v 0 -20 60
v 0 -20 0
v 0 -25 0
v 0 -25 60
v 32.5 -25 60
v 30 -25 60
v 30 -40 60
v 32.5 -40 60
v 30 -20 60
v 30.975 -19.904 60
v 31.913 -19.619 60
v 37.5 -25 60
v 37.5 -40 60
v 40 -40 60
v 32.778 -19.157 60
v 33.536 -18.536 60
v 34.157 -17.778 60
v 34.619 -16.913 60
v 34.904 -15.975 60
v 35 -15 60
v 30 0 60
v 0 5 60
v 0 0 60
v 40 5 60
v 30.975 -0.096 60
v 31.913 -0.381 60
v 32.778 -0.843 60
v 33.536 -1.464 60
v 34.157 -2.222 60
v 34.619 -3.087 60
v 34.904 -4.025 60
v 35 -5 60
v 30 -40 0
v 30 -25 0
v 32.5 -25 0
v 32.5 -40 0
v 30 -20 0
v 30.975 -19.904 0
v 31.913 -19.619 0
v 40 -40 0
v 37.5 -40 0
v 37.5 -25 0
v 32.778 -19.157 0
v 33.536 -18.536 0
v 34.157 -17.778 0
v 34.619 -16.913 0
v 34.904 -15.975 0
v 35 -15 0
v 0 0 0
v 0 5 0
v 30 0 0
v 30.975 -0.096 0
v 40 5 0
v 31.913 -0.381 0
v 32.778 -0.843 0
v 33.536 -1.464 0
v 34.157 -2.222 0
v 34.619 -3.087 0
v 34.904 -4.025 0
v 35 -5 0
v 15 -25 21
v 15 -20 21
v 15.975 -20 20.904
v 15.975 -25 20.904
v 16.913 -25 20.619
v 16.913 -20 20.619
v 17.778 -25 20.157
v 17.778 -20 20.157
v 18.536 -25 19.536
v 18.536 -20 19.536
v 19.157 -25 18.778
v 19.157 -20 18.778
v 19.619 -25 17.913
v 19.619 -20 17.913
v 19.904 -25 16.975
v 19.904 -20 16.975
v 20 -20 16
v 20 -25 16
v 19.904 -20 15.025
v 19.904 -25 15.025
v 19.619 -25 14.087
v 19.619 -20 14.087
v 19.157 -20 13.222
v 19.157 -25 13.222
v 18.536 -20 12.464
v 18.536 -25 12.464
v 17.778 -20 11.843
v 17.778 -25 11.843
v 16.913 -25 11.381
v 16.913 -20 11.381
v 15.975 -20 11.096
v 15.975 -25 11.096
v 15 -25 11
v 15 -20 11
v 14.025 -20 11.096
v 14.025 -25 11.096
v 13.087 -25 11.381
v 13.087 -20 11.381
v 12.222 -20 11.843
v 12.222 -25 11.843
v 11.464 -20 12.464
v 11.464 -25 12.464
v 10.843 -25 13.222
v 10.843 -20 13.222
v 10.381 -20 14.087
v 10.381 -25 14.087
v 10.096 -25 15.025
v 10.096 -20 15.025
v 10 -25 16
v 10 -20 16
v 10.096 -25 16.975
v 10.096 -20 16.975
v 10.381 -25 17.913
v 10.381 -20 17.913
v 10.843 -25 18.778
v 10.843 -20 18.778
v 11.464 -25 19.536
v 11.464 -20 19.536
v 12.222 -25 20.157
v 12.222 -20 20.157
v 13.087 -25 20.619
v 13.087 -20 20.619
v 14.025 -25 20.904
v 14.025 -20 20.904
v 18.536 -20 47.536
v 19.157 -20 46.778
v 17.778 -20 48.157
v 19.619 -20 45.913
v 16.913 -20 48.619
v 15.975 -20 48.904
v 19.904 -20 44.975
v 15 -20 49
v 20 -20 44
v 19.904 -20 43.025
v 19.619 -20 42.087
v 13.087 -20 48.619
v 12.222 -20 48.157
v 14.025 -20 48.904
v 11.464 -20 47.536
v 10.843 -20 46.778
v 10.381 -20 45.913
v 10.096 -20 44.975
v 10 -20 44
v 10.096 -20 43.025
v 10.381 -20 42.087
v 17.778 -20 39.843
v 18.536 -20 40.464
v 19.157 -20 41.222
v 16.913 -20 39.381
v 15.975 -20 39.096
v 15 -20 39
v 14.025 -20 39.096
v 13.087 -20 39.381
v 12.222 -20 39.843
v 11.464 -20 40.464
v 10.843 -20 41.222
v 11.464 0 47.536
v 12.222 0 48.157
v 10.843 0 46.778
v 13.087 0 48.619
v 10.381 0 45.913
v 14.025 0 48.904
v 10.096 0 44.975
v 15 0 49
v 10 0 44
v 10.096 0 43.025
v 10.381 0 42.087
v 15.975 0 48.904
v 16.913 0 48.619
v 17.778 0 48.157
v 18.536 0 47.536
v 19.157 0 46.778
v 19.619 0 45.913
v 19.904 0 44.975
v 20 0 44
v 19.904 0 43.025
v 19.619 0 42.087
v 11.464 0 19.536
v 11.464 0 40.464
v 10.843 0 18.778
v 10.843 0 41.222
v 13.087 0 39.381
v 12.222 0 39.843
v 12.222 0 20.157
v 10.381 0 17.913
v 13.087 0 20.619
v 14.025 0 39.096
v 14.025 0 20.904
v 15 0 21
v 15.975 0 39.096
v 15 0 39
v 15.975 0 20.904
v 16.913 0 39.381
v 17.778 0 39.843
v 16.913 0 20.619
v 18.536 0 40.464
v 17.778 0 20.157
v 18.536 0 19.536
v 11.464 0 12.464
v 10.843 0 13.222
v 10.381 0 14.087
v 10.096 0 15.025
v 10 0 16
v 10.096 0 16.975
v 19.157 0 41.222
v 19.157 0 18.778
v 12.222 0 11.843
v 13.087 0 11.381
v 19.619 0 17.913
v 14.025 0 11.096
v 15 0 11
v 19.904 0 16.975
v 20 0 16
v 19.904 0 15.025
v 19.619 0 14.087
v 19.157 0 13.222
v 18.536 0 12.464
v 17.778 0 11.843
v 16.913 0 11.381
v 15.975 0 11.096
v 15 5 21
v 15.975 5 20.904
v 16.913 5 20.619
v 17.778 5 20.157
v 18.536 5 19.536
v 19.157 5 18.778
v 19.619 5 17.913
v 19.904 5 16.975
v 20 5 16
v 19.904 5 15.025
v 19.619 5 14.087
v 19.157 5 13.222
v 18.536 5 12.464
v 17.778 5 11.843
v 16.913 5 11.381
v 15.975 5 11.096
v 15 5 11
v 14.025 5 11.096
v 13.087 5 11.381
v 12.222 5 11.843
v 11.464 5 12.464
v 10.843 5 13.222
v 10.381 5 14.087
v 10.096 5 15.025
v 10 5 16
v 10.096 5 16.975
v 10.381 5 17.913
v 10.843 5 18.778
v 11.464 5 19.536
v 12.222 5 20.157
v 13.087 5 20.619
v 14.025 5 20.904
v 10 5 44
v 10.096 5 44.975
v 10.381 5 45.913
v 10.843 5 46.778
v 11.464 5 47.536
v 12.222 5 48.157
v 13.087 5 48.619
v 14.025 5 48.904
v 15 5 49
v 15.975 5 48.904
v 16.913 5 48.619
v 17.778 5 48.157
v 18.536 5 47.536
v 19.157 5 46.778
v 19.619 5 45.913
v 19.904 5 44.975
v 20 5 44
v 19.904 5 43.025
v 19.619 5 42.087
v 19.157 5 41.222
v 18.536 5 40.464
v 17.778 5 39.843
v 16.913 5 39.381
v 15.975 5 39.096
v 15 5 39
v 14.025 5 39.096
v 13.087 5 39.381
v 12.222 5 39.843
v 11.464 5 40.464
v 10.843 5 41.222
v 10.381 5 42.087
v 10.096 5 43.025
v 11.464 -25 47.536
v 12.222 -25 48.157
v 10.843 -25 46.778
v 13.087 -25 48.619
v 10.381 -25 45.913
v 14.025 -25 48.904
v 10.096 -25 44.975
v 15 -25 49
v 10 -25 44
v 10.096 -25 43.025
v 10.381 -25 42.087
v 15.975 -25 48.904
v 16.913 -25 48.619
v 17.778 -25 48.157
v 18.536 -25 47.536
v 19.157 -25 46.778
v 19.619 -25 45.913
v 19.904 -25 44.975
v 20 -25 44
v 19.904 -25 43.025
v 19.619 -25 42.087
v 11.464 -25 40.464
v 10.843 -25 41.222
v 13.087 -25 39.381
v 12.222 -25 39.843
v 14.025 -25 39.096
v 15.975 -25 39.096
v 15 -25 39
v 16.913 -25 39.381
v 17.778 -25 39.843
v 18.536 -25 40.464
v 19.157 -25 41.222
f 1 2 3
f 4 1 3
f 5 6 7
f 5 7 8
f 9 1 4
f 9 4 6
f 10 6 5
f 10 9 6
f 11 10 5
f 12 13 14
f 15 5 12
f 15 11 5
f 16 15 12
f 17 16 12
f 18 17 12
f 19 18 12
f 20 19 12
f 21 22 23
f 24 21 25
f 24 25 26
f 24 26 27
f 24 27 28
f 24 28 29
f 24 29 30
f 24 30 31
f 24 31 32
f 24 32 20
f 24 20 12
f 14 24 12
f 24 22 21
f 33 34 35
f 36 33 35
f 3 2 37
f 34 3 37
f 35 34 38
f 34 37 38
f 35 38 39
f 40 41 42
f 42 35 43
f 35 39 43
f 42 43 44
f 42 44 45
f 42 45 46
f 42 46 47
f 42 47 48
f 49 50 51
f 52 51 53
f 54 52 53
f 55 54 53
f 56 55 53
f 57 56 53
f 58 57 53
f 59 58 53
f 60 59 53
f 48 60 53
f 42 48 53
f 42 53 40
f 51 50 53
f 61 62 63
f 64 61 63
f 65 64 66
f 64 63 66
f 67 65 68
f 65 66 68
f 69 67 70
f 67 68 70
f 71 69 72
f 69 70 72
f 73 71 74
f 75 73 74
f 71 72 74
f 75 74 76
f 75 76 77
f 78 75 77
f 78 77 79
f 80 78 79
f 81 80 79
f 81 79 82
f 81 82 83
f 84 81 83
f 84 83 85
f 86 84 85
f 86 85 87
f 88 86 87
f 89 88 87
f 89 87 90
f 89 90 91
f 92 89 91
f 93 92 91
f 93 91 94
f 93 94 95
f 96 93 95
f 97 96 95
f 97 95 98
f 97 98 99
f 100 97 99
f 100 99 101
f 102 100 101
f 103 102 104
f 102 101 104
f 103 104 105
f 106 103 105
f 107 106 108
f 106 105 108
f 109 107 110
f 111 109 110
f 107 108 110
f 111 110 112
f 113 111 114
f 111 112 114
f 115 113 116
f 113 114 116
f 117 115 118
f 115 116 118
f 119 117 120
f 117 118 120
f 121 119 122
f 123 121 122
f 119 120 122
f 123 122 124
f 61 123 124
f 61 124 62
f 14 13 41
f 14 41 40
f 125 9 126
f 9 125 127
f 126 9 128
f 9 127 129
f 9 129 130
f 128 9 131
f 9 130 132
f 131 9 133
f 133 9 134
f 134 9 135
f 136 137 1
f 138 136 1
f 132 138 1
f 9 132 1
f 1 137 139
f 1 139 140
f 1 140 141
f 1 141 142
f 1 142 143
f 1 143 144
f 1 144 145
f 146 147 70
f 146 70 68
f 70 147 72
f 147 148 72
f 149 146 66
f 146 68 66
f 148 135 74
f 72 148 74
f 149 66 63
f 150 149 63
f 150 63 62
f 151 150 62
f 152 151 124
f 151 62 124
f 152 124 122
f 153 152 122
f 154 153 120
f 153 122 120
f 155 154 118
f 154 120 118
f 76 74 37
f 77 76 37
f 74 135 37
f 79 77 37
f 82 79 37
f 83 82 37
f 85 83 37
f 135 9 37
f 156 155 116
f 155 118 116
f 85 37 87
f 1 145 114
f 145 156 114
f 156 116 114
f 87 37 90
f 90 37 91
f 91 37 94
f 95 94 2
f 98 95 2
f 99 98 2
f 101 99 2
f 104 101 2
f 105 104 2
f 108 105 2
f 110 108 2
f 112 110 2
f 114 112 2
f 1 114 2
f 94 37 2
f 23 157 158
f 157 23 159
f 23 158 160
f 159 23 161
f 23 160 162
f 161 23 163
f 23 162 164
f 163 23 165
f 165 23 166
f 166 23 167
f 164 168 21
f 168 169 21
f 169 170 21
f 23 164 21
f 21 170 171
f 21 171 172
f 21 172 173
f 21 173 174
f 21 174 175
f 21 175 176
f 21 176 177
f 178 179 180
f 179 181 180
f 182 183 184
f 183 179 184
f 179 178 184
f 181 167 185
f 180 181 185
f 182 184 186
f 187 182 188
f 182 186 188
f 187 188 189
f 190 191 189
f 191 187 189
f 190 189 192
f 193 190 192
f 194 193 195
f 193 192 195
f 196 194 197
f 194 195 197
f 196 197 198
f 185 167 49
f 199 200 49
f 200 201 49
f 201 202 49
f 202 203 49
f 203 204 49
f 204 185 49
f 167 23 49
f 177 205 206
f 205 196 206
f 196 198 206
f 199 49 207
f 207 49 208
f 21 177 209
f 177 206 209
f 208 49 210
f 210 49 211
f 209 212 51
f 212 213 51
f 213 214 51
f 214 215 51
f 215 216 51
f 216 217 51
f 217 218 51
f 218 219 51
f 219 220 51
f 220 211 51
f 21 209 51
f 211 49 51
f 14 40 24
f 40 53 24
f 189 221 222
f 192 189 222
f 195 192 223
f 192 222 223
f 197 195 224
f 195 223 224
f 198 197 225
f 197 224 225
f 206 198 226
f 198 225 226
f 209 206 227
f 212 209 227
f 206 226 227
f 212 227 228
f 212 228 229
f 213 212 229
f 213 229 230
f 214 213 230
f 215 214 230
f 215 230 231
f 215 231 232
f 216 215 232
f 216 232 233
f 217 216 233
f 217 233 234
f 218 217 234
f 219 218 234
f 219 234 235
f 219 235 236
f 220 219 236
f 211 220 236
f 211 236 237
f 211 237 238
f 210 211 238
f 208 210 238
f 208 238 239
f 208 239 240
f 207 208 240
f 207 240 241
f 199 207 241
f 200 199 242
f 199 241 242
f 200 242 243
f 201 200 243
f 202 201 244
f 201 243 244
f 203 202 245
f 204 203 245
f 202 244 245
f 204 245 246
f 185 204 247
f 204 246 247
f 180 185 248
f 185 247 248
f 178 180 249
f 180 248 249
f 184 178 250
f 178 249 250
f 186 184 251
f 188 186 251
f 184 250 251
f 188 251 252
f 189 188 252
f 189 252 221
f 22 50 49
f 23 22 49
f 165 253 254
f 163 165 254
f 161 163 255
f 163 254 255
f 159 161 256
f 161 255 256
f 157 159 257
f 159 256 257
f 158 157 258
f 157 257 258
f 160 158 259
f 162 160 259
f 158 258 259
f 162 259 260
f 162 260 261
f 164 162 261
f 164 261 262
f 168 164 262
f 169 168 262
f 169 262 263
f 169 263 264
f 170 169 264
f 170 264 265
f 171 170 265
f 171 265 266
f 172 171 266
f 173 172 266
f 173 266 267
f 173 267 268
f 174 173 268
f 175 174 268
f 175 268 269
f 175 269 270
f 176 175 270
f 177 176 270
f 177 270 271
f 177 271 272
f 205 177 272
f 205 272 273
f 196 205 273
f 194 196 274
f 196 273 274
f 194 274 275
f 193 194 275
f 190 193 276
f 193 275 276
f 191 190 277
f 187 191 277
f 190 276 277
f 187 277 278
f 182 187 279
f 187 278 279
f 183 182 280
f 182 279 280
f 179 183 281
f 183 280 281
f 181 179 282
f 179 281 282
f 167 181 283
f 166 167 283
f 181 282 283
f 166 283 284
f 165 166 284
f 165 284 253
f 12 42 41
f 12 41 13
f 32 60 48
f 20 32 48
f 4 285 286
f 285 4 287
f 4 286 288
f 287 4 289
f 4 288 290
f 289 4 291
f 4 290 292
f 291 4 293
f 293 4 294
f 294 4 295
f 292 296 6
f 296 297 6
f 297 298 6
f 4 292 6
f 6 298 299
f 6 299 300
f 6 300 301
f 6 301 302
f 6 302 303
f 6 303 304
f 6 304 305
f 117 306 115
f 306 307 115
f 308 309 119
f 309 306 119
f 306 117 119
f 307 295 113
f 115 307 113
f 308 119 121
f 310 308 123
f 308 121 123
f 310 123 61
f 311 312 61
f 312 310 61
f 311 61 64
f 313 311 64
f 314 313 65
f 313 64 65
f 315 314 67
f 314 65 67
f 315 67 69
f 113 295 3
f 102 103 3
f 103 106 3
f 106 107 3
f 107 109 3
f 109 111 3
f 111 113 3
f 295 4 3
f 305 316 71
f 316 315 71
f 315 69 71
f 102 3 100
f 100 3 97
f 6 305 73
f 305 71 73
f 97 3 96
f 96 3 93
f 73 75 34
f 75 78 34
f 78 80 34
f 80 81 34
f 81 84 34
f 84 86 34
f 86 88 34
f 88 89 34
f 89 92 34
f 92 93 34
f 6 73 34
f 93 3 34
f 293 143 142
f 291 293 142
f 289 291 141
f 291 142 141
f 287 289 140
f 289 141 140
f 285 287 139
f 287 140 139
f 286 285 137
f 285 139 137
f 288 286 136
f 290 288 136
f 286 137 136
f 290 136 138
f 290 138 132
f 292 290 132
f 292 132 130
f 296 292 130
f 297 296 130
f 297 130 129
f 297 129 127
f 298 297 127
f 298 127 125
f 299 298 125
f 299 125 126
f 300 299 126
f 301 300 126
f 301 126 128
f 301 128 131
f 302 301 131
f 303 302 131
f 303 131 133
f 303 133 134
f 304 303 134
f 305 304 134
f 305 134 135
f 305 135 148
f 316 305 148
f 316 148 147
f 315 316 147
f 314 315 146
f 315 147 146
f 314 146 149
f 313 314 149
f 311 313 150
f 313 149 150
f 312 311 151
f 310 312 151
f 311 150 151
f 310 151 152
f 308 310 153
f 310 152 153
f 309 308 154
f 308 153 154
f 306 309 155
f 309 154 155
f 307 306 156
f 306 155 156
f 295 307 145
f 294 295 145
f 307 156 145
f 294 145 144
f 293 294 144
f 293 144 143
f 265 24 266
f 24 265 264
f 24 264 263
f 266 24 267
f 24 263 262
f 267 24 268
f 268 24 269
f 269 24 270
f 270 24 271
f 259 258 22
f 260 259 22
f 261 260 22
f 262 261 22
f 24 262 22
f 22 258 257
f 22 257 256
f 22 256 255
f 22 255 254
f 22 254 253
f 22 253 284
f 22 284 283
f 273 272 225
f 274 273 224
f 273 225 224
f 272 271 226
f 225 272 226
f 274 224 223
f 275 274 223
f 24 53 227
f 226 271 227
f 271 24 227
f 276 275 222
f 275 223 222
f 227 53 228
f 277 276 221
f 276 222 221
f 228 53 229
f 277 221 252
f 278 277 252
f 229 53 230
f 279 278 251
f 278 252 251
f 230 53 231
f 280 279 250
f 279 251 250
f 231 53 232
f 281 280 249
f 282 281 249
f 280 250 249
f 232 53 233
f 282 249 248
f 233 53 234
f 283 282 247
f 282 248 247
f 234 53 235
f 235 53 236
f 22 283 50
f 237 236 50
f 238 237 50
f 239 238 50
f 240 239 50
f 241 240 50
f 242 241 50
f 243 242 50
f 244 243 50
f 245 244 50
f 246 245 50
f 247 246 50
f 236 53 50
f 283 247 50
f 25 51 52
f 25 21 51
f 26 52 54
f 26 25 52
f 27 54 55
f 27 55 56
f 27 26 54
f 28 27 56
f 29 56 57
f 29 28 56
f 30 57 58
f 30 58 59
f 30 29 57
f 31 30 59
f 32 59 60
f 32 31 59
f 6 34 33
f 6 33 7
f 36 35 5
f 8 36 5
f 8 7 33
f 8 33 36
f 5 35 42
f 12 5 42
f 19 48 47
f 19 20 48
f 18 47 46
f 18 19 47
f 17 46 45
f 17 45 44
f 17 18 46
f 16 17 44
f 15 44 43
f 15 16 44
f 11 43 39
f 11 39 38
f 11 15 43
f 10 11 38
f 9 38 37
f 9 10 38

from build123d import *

# Parameters (mm, degrees)
BOSS_EXTRUDE1_DEPTH = 60
FILLET1_R           = 5
SKETCH2_R           = 5
CUT_EXTRUDE1_DEPTH  = 75
SKETCH3_W           = 2.5
SKETCH3_H           = 60
BOSS_EXTRUDE2_DEPTH = 15


with BuildPart() as part:
    # Sketch1 → Boss-Extrude1 (new body)
    with BuildSketch(Plane.XY):
        Polygon((0, 0), (35, 0), (35, -20), (0, -20), (0, -25), (40, -25), (40, 5), (0, 5), align=None)
    extrude(amount=BOSS_EXTRUDE1_DEPTH)

    # Fillet1
    fillet1_edges = [part.edges().sort_by_distance(p)[0] for p in [
        (35, -20, 30),
        (35, 0, 30),
    ]]
    fillet(fillet1_edges, radius=FILLET1_R)

    # Sketch2 → Cut-Extrude1 (cut)
    with BuildSketch(Plane(origin=(0, 5, 0), x_dir=(1, 0, 0), z_dir=(0, 1, 0))):
        with Locations(Location((15, -44, 0), (0, 0, 180))):
            Circle(SKETCH2_R)
        with Locations(Location((15, -16, 0), (0, 0, 270))):
            Circle(SKETCH2_R)
    extrude(amount=-CUT_EXTRUDE1_DEPTH, mode=Mode.SUBTRACT)

    # Sketch3 → Boss-Extrude2 (add)
    with BuildSketch(Plane.XZ.offset(25)):
        with Locations((31.25, 30)):
            Rectangle(SKETCH3_W, SKETCH3_H)
        with Locations((38.75, 30)):
            Rectangle(SKETCH3_W, SKETCH3_H)
    extrude(amount=BOSS_EXTRUDE2_DEPTH)


solid = part.part
